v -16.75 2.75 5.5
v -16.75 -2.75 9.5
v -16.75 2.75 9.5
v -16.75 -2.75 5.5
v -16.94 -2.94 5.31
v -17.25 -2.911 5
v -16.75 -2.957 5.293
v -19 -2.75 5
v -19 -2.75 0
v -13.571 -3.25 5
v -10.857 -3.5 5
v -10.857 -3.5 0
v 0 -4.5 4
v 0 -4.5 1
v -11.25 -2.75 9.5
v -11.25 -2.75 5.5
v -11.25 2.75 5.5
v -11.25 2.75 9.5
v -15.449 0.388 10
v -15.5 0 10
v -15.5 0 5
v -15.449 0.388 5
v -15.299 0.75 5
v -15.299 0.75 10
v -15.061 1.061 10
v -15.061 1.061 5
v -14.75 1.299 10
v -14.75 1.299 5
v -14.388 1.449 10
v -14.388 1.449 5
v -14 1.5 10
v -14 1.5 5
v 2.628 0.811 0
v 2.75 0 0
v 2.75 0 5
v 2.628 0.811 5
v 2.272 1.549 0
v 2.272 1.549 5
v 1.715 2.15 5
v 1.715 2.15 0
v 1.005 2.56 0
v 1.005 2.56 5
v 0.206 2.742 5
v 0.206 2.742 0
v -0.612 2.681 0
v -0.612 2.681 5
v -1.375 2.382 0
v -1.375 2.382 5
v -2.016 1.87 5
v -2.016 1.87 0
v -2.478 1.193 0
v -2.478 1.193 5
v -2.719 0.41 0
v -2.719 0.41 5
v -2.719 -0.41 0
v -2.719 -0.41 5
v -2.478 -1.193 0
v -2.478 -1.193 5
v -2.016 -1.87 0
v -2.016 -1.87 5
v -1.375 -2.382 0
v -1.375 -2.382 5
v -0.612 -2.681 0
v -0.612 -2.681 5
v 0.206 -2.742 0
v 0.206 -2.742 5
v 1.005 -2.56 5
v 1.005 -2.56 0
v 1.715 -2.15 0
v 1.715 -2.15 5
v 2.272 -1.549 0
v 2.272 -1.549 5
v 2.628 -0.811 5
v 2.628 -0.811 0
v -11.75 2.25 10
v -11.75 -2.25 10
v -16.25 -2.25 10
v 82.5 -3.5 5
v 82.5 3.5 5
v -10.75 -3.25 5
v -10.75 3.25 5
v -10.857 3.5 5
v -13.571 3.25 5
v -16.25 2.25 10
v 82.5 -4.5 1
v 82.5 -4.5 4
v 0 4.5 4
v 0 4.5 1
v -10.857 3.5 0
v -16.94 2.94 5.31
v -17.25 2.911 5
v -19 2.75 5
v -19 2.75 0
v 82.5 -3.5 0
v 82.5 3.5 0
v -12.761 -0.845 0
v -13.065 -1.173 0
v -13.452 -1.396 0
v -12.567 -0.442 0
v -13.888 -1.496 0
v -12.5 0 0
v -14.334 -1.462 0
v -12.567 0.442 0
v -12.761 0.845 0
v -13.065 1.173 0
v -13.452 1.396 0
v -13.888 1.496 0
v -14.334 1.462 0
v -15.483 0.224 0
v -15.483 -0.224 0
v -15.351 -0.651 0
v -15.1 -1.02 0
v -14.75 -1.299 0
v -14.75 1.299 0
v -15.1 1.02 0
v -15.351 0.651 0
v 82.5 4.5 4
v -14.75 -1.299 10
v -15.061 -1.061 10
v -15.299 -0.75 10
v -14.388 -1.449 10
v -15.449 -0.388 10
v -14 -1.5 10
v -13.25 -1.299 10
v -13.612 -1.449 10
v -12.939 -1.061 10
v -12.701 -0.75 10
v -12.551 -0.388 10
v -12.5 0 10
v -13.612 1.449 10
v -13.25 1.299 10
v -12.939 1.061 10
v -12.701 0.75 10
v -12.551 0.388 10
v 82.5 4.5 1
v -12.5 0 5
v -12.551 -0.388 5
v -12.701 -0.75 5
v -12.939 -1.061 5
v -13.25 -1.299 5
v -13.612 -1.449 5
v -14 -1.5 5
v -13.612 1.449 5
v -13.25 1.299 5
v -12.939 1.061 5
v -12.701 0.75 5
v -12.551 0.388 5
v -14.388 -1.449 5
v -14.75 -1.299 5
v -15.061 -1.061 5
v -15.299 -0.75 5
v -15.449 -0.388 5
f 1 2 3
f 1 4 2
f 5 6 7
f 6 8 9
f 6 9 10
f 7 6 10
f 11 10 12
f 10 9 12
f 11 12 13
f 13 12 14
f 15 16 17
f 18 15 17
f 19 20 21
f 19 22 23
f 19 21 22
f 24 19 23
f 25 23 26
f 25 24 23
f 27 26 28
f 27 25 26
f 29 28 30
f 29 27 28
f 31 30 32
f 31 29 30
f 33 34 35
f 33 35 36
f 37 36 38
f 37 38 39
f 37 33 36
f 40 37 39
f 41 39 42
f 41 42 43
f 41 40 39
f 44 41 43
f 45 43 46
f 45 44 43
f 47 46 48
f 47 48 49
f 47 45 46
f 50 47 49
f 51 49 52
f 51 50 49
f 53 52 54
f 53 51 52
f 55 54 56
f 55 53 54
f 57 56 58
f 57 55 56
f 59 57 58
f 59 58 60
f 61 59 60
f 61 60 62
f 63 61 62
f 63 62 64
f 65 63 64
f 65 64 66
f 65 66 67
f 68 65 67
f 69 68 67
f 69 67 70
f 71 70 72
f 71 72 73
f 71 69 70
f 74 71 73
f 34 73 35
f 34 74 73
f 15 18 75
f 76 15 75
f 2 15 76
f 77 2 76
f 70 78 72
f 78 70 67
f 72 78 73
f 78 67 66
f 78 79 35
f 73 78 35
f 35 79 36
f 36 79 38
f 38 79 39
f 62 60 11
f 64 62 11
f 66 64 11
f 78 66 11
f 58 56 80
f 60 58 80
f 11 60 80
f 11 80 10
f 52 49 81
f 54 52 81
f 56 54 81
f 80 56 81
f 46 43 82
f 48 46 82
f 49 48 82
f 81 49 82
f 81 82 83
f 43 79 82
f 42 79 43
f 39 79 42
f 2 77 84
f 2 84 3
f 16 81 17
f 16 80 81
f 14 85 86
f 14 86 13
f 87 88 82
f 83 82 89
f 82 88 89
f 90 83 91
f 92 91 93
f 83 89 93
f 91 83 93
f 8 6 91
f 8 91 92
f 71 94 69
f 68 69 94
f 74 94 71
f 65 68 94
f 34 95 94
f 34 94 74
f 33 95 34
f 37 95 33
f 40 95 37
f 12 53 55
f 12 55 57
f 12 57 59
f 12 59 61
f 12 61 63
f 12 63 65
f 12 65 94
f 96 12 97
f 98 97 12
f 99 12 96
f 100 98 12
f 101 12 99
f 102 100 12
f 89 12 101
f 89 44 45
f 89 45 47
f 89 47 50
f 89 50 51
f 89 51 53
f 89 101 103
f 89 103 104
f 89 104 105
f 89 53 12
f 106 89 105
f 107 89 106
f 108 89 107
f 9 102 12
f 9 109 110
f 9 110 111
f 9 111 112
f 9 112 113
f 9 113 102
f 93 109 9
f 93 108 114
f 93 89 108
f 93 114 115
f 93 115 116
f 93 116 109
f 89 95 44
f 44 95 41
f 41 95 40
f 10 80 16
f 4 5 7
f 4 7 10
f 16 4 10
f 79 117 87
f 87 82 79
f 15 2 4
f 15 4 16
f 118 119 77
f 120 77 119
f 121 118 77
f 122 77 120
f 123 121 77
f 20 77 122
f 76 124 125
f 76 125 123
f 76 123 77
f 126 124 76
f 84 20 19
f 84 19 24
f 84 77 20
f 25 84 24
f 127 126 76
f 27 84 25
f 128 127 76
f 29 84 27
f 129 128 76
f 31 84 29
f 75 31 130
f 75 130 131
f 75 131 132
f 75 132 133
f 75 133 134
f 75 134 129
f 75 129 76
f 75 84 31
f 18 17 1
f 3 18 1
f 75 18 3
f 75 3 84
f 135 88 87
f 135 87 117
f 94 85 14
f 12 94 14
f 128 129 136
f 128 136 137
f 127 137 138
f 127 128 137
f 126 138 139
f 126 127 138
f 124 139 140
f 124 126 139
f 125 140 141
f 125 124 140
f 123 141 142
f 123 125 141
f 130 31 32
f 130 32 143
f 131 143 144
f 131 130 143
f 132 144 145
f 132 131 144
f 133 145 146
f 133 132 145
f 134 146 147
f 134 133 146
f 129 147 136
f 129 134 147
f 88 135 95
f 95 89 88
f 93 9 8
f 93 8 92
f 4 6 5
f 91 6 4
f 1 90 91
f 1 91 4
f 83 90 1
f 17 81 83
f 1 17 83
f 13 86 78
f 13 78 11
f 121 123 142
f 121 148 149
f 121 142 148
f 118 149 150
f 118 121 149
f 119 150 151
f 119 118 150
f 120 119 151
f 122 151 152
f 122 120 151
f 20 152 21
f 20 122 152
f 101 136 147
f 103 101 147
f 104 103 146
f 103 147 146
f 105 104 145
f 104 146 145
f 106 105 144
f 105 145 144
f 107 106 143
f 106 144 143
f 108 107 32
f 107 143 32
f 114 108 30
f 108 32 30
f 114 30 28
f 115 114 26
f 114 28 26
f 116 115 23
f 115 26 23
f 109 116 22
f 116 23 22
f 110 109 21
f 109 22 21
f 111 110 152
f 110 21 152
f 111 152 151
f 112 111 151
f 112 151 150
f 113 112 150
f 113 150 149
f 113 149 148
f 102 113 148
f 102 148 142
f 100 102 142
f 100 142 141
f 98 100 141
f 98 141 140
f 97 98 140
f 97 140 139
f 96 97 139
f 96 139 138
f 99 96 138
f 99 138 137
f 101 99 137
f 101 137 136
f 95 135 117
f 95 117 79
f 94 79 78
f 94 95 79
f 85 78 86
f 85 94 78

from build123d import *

# Parameters (mm, degrees)
SKETCH1_R           = 2.75
BOSS_EXTRUDE1_DEPTH = 5
CHAMFER1_SIZE       = 1
SKETCH2_R           = 1.5
CUT_EXTRUDE1_DEPTH  = 83.773788122
BOSS_EXTRUDE2_START = 5
SKETCH3_W           = 5.5
SKETCH3_H           = 5.5
SKETCH3_W_2         = 3
SKETCH3_H_2         = 3
BOSS_EXTRUDE2_DEPTH = 5
CHAMFER3_SIZE       = 0.5


with BuildPart() as part:
    # Sketch1 → Boss-Extrude1 (new body)
    with BuildSketch(Plane.XY):
        Polygon((82.5, 4.5), (82.5, -4.5), (0, -4.5), (-19, -2.75), (-19, 2.75), (0, 4.5), align=None)
        Circle(SKETCH1_R, mode=Mode.SUBTRACT)
    extrude(amount=BOSS_EXTRUDE1_DEPTH)

    # Chamfer1
    # the kernel refuses this chamfer: 1 mm, written as the material it takes off along each edge
    with BuildSketch(Plane(origin=(-12.85841494, 4.5, 5), x_dir=(0, 0, -1), z_dir=(1, 0, 0)), Plane(origin=(85.071682988, -4.5, 5), x_dir=(0, 0, -1), z_dir=(-1, 0, 0))) as chamfer1_piece_1:
        Polygon((CHAMFER1_SIZE, 0), (0, -CHAMFER1_SIZE), (0, 0), align=None)
    extrude(amount=97.930097928, mode=Mode.SUBTRACT)
    with BuildSketch(Plane(origin=(-12.85841494, 4.5, 0), x_dir=(0, 0, 1), z_dir=(1, 0, 0)), Plane(origin=(85.071682988, -4.5, 0), x_dir=(0, 0, 1), z_dir=(-1, 0, 0))) as chamfer1_piece_2:
        Polygon((CHAMFER1_SIZE, 0), (0, CHAMFER1_SIZE), (0, 0), align=None)
    extrude(amount=97.930097928, mode=Mode.SUBTRACT)

    # Sketch2 → Cut-Extrude1 (cut, through all)
    with BuildSketch(Plane.XY.offset(5)):
        with Locations((-14, 0)):
            Circle(SKETCH2_R)
    extrude(amount=-CUT_EXTRUDE1_DEPTH, mode=Mode.SUBTRACT)

    # Sketch3 → Boss-Extrude2 (add)
    # profile 1 of 5: a face of its own
    with BuildSketch(Plane.XY.offset(5).offset(BOSS_EXTRUDE2_START)):
        with Locations((-14, 0)):
            Rectangle(SKETCH3_W, SKETCH3_H)
        with Locations((-14, 0)):
            Rectangle(SKETCH3_W_2, SKETCH3_H_2, mode=Mode.SUBTRACT)
    # profile 2 of 5: a face of its own
    with BuildSketch(Plane.XY.offset(5).offset(BOSS_EXTRUDE2_START)):
        with BuildLine():
            Line((-15.5, 1.5), (-15.5, 3e-09))
            ThreePointArc((-15.5, 3e-09), (-15.060660171, 1.060660173), (-14, 1.5))
            Line((-14, 1.5), (-15.5, 1.5))
        make_face()
    # profile 3 of 5: a face of its own
    with BuildSketch(Plane.XY.offset(5).offset(BOSS_EXTRUDE2_START)):
        with BuildLine():
            Line((-15.5, 3e-09), (-15.5, -1.5))
            Line((-15.5, -1.5), (-14, -1.5))
            ThreePointArc((-14, -1.5), (-15.060660173, -1.060660171), (-15.5, 3e-09))
        make_face()
    # profile 4 of 5: a face of its own
    with BuildSketch(Plane.XY.offset(5).offset(BOSS_EXTRUDE2_START)):
        with BuildLine():
            ThreePointArc((-12.5, 0), (-12.939339828, -1.060660172), (-14, -1.5))
            Line((-14, -1.5), (-12.5, -1.5))
            Line((-12.5, -1.5), (-12.5, 0))
        make_face()
    # profile 5 of 5: a face of its own
    with BuildSketch(Plane.XY.offset(5).offset(BOSS_EXTRUDE2_START)):
        with BuildLine():
            ThreePointArc((-14, 1.5), (-12.939339828, 1.060660172), (-12.5, 0))
            Line((-12.5, 0), (-12.5, 1.5))
            Line((-12.5, 1.5), (-14, 1.5))
        make_face()
    extrude(amount=-BOSS_EXTRUDE2_DEPTH)

    # Chamfer3
    # the kernel refuses this chamfer: 0.5 mm, written as the material it adds along each edge
    with BuildSketch(Plane(origin=(-16.75, -2.75, 5), x_dir=(0, -1, 0), z_dir=(1, 0, 0))) as chamfer3_piece_1_section:
        Polygon((CHAMFER3_SIZE, 0), (0, -CHAMFER3_SIZE), (0, 0), align=None)
    chamfer3_piece_1 = extrude(amount=5.5, mode=Mode.PRIVATE)
    chamfer3_piece_1 = split(chamfer3_piece_1, bisect_by=Plane(origin=(-16.768927039, -2.955493562, 5), z_dir=(0.09171704949125846, 0.995785108762236, 0)), keep=Keep.TOP, mode=Mode.PRIVATE)
    add(chamfer3_piece_1)
    with BuildSketch(Plane(origin=(-11.25, -2.75, 5), x_dir=(1, 0, 0), z_dir=(0, 1, 0)), Plane(origin=(-16.75, 2.75, 5), x_dir=(-1, 0, 0), z_dir=(0, -1, 0))) as chamfer3_piece_2:
        Polygon((CHAMFER3_SIZE, 0), (0, -CHAMFER3_SIZE), (0, 0), align=None)
    extrude(amount=5.5)
    with BuildSketch(Plane(origin=(-11.25, 2.75, 5), x_dir=(0, 1, 0), z_dir=(-1, 0, 0))) as chamfer3_piece_3_section:
        Polygon((CHAMFER3_SIZE, 0), (0, -CHAMFER3_SIZE), (0, 0), align=None)
    chamfer3_piece_3 = extrude(amount=5.5, mode=Mode.PRIVATE)
    chamfer3_piece_3 = split(chamfer3_piece_3, bisect_by=Plane(origin=(-11.315193133, 3.457811159, 5), z_dir=(0.09171704949125607, -0.9957851087622361, 0)), keep=Keep.TOP, mode=Mode.PRIVATE)
    add(chamfer3_piece_3)
    with BuildSketch(Plane(origin=(-16.75, 2.75, 5), x_dir=(-1, 0, 0), z_dir=(0, -1, 0))) as chamfer3_piece_4a_section:
        Polygon((CHAMFER3_SIZE, 0), (0, -CHAMFER3_SIZE), (0, 0), align=None)
    chamfer3_piece_4a = extrude(amount=6.785841494, mode=Mode.PRIVATE)
    chamfer3_piece_4a = split(chamfer3_piece_4a, bisect_by=Plane(origin=(-17.271244635, -2.909227468, 5), z_dir=(0.09171704949125846, 0.995785108762236, 0)), keep=Keep.TOP, mode=Mode.PRIVATE)
    chamfer3_piece_4a = split(chamfer3_piece_4a, bisect_by=Plane(origin=(-16.75, -2.75, 5), z_dir=(0, -1, 0)), keep=Keep.TOP, mode=Mode.PRIVATE)
    with BuildSketch(Plane(origin=(-18.035841494, -2.75, 5), x_dir=(0, -1, 0), z_dir=(1, 0, 0))) as chamfer3_piece_4b_section:
        Polygon((CHAMFER3_SIZE, 0), (0, -CHAMFER3_SIZE), (0, 0), align=None)
    chamfer3_piece_4b = extrude(amount=6.785841494, mode=Mode.PRIVATE)
    chamfer3_piece_4b = split(chamfer3_piece_4b, bisect_by=Plane(origin=(-18.043952012, -2.838057052, 5), z_dir=(0.09171704949125846, 0.995785108762236, 0)), keep=Keep.TOP, mode=Mode.PRIVATE)
    chamfer3_piece_4b = split(chamfer3_piece_4b, bisect_by=Plane(origin=(-16.75, -2.75, 5), z_dir=(-1, 0, 0)), keep=Keep.TOP, mode=Mode.PRIVATE)
    chamfer3_piece_4 = chamfer3_piece_4a & chamfer3_piece_4b
    add(chamfer3_piece_4)
    with BuildSketch(Plane(origin=(-11.25, -4.035841494, 5), x_dir=(1, 0, 0), z_dir=(0, 1, 0))) as chamfer3_piece_5a_section:
        Polygon((CHAMFER3_SIZE, 0), (0, -CHAMFER3_SIZE), (0, 0), align=None)
    chamfer3_piece_5a = extrude(amount=6.785841494, mode=Mode.PRIVATE)
    chamfer3_piece_5a = split(chamfer3_piece_5a, bisect_by=Plane(origin=(-11.25, -3.767920747, 4.732079253), z_dir=(0, 0.7071067811865476, -0.7071067811865476)), keep=Keep.TOP, mode=Mode.PRIVATE)
    chamfer3_piece_5a = split(chamfer3_piece_5a, bisect_by=Plane(origin=(-11.197756622, -3.46862768, 5), z_dir=(0.09171704949125846, 0.995785108762236, 0)), keep=Keep.TOP, mode=Mode.PRIVATE)
    chamfer3_piece_5a = split(chamfer3_piece_5a, bisect_by=Plane(origin=(-11.25, -2.75, 5), z_dir=(0, -1, 0)), keep=Keep.TOP, mode=Mode.PRIVATE)
    with BuildSketch(Plane(origin=(-16.75, -2.75, 5), x_dir=(0, -1, 0), z_dir=(1, 0, 0))) as chamfer3_piece_5b_section:
        Polygon((CHAMFER3_SIZE, 0), (0, -CHAMFER3_SIZE), (0, 0), align=None)
    chamfer3_piece_5b = extrude(amount=6.785841494, mode=Mode.PRIVATE)
    chamfer3_piece_5b = split(chamfer3_piece_5b, bisect_by=Plane(origin=(-11.25, -2.75, 5), z_dir=(1, 0, 0)), keep=Keep.TOP, mode=Mode.PRIVATE)
    chamfer3_piece_5 = chamfer3_piece_5a & chamfer3_piece_5b
    add(chamfer3_piece_5)
    with BuildSketch(Plane(origin=(-9.964158506, 2.75, 5), x_dir=(0, 1, 0), z_dir=(-1, 0, 0))) as chamfer3_piece_6a_section:
        Polygon((CHAMFER3_SIZE, 0), (0, -CHAMFER3_SIZE), (0, 0), align=None)
    chamfer3_piece_6a = extrude(amount=6.785841494, mode=Mode.PRIVATE)
    chamfer3_piece_6a = split(chamfer3_piece_6a, bisect_by=Plane(origin=(-11.25, 2.75, 5), z_dir=(1, 0, 0)), keep=Keep.TOP, mode=Mode.PRIVATE)
    with BuildSketch(Plane(origin=(-11.25, -2.75, 5), x_dir=(1, 0, 0), z_dir=(0, 1, 0))) as chamfer3_piece_6b_section:
        Polygon((CHAMFER3_SIZE, 0), (0, -CHAMFER3_SIZE), (0, 0), align=None)
    chamfer3_piece_6b = extrude(amount=6.785841494, mode=Mode.PRIVATE)
    chamfer3_piece_6b = split(chamfer3_piece_6b, bisect_by=Plane(origin=(-11.25, 0.375, 8.125), z_dir=(0, -0.7071067811865476, -0.7071067811865476)), keep=Keep.TOP, mode=Mode.PRIVATE)
    chamfer3_piece_6b = split(chamfer3_piece_6b, bisect_by=Plane(origin=(-11.81751073, 3.411545064, 5), z_dir=(0.09171704949125607, -0.9957851087622361, 0)), keep=Keep.TOP, mode=Mode.PRIVATE)
    chamfer3_piece_6b = split(chamfer3_piece_6b, bisect_by=Plane(origin=(-11.25, 2.75, 5), z_dir=(0, 1, 0)), keep=Keep.TOP, mode=Mode.PRIVATE)
    chamfer3_piece_6 = chamfer3_piece_6a & chamfer3_piece_6b
    add(chamfer3_piece_6)
    with BuildSketch(Plane(origin=(-16.75, 4.035841494, 5), x_dir=(-1, 0, 0), z_dir=(0, -1, 0))) as chamfer3_piece_7a_section:
        Polygon((CHAMFER3_SIZE, 0), (0, -CHAMFER3_SIZE), (0, 0), align=None)
    chamfer3_piece_7a = extrude(amount=6.785841494, mode=Mode.PRIVATE)
    chamfer3_piece_7a = split(chamfer3_piece_7a, bisect_by=Plane(origin=(-16.651490528, 2.966310083, 5), z_dir=(0.09171704949125607, -0.9957851087622361, 0)), keep=Keep.TOP, mode=Mode.PRIVATE)
    chamfer3_piece_7a = split(chamfer3_piece_7a, bisect_by=Plane(origin=(-16.75, 2.75, 5), z_dir=(0, 1, 0)), keep=Keep.TOP, mode=Mode.PRIVATE)
    with BuildSketch(Plane(origin=(-11.25, 2.75, 5), x_dir=(0, 1, 0), z_dir=(-1, 0, 0))) as chamfer3_piece_7b_section:
        Polygon((CHAMFER3_SIZE, 0), (0, -CHAMFER3_SIZE), (0, 0), align=None)
    chamfer3_piece_7b = extrude(amount=6.785841494, mode=Mode.PRIVATE)
    chamfer3_piece_7b = split(chamfer3_piece_7b, bisect_by=Plane(origin=(-11.315193133, 3.457811159, 5), z_dir=(0.09171704949125607, -0.9957851087622361, 0)), keep=Keep.TOP, mode=Mode.PRIVATE)
    chamfer3_piece_7b = split(chamfer3_piece_7b, bisect_by=Plane(origin=(-16.75, 2.75, 5), z_dir=(-1, 0, 0)), keep=Keep.TOP, mode=Mode.PRIVATE)
    chamfer3_piece_7 = chamfer3_piece_7a & chamfer3_piece_7b
    add(chamfer3_piece_7)
    # the kernel refuses this chamfer: 0.5 mm, written as the material it takes off along each edge
    with BuildSketch(Plane(origin=(-9.964158506, 2.75, 10), x_dir=(0, 0, -1), z_dir=(-1, 0, 0)), Plane(origin=(-18.035841494, -2.75, 10), x_dir=(0, 0, -1), z_dir=(1, 0, 0)), Plane(origin=(-11.25, -4.035841494, 10), x_dir=(0, 0, -1), z_dir=(0, 1, 0))) as chamfer3_2_piece_1:
        Polygon((CHAMFER3_SIZE, 0), (0, CHAMFER3_SIZE), (0, 0), align=None)
    extrude(amount=8.071682988, mode=Mode.SUBTRACT)
    with BuildSketch(Plane(origin=(-16.75, 4.035841494, 10), x_dir=(1, 0, 0), z_dir=(0, -1, 0))) as chamfer3_2_piece_2:
        Polygon((CHAMFER3_SIZE, 0), (0, -CHAMFER3_SIZE), (0, 0), align=None)
    extrude(amount=8.071682988, mode=Mode.SUBTRACT)


solid = part.part
